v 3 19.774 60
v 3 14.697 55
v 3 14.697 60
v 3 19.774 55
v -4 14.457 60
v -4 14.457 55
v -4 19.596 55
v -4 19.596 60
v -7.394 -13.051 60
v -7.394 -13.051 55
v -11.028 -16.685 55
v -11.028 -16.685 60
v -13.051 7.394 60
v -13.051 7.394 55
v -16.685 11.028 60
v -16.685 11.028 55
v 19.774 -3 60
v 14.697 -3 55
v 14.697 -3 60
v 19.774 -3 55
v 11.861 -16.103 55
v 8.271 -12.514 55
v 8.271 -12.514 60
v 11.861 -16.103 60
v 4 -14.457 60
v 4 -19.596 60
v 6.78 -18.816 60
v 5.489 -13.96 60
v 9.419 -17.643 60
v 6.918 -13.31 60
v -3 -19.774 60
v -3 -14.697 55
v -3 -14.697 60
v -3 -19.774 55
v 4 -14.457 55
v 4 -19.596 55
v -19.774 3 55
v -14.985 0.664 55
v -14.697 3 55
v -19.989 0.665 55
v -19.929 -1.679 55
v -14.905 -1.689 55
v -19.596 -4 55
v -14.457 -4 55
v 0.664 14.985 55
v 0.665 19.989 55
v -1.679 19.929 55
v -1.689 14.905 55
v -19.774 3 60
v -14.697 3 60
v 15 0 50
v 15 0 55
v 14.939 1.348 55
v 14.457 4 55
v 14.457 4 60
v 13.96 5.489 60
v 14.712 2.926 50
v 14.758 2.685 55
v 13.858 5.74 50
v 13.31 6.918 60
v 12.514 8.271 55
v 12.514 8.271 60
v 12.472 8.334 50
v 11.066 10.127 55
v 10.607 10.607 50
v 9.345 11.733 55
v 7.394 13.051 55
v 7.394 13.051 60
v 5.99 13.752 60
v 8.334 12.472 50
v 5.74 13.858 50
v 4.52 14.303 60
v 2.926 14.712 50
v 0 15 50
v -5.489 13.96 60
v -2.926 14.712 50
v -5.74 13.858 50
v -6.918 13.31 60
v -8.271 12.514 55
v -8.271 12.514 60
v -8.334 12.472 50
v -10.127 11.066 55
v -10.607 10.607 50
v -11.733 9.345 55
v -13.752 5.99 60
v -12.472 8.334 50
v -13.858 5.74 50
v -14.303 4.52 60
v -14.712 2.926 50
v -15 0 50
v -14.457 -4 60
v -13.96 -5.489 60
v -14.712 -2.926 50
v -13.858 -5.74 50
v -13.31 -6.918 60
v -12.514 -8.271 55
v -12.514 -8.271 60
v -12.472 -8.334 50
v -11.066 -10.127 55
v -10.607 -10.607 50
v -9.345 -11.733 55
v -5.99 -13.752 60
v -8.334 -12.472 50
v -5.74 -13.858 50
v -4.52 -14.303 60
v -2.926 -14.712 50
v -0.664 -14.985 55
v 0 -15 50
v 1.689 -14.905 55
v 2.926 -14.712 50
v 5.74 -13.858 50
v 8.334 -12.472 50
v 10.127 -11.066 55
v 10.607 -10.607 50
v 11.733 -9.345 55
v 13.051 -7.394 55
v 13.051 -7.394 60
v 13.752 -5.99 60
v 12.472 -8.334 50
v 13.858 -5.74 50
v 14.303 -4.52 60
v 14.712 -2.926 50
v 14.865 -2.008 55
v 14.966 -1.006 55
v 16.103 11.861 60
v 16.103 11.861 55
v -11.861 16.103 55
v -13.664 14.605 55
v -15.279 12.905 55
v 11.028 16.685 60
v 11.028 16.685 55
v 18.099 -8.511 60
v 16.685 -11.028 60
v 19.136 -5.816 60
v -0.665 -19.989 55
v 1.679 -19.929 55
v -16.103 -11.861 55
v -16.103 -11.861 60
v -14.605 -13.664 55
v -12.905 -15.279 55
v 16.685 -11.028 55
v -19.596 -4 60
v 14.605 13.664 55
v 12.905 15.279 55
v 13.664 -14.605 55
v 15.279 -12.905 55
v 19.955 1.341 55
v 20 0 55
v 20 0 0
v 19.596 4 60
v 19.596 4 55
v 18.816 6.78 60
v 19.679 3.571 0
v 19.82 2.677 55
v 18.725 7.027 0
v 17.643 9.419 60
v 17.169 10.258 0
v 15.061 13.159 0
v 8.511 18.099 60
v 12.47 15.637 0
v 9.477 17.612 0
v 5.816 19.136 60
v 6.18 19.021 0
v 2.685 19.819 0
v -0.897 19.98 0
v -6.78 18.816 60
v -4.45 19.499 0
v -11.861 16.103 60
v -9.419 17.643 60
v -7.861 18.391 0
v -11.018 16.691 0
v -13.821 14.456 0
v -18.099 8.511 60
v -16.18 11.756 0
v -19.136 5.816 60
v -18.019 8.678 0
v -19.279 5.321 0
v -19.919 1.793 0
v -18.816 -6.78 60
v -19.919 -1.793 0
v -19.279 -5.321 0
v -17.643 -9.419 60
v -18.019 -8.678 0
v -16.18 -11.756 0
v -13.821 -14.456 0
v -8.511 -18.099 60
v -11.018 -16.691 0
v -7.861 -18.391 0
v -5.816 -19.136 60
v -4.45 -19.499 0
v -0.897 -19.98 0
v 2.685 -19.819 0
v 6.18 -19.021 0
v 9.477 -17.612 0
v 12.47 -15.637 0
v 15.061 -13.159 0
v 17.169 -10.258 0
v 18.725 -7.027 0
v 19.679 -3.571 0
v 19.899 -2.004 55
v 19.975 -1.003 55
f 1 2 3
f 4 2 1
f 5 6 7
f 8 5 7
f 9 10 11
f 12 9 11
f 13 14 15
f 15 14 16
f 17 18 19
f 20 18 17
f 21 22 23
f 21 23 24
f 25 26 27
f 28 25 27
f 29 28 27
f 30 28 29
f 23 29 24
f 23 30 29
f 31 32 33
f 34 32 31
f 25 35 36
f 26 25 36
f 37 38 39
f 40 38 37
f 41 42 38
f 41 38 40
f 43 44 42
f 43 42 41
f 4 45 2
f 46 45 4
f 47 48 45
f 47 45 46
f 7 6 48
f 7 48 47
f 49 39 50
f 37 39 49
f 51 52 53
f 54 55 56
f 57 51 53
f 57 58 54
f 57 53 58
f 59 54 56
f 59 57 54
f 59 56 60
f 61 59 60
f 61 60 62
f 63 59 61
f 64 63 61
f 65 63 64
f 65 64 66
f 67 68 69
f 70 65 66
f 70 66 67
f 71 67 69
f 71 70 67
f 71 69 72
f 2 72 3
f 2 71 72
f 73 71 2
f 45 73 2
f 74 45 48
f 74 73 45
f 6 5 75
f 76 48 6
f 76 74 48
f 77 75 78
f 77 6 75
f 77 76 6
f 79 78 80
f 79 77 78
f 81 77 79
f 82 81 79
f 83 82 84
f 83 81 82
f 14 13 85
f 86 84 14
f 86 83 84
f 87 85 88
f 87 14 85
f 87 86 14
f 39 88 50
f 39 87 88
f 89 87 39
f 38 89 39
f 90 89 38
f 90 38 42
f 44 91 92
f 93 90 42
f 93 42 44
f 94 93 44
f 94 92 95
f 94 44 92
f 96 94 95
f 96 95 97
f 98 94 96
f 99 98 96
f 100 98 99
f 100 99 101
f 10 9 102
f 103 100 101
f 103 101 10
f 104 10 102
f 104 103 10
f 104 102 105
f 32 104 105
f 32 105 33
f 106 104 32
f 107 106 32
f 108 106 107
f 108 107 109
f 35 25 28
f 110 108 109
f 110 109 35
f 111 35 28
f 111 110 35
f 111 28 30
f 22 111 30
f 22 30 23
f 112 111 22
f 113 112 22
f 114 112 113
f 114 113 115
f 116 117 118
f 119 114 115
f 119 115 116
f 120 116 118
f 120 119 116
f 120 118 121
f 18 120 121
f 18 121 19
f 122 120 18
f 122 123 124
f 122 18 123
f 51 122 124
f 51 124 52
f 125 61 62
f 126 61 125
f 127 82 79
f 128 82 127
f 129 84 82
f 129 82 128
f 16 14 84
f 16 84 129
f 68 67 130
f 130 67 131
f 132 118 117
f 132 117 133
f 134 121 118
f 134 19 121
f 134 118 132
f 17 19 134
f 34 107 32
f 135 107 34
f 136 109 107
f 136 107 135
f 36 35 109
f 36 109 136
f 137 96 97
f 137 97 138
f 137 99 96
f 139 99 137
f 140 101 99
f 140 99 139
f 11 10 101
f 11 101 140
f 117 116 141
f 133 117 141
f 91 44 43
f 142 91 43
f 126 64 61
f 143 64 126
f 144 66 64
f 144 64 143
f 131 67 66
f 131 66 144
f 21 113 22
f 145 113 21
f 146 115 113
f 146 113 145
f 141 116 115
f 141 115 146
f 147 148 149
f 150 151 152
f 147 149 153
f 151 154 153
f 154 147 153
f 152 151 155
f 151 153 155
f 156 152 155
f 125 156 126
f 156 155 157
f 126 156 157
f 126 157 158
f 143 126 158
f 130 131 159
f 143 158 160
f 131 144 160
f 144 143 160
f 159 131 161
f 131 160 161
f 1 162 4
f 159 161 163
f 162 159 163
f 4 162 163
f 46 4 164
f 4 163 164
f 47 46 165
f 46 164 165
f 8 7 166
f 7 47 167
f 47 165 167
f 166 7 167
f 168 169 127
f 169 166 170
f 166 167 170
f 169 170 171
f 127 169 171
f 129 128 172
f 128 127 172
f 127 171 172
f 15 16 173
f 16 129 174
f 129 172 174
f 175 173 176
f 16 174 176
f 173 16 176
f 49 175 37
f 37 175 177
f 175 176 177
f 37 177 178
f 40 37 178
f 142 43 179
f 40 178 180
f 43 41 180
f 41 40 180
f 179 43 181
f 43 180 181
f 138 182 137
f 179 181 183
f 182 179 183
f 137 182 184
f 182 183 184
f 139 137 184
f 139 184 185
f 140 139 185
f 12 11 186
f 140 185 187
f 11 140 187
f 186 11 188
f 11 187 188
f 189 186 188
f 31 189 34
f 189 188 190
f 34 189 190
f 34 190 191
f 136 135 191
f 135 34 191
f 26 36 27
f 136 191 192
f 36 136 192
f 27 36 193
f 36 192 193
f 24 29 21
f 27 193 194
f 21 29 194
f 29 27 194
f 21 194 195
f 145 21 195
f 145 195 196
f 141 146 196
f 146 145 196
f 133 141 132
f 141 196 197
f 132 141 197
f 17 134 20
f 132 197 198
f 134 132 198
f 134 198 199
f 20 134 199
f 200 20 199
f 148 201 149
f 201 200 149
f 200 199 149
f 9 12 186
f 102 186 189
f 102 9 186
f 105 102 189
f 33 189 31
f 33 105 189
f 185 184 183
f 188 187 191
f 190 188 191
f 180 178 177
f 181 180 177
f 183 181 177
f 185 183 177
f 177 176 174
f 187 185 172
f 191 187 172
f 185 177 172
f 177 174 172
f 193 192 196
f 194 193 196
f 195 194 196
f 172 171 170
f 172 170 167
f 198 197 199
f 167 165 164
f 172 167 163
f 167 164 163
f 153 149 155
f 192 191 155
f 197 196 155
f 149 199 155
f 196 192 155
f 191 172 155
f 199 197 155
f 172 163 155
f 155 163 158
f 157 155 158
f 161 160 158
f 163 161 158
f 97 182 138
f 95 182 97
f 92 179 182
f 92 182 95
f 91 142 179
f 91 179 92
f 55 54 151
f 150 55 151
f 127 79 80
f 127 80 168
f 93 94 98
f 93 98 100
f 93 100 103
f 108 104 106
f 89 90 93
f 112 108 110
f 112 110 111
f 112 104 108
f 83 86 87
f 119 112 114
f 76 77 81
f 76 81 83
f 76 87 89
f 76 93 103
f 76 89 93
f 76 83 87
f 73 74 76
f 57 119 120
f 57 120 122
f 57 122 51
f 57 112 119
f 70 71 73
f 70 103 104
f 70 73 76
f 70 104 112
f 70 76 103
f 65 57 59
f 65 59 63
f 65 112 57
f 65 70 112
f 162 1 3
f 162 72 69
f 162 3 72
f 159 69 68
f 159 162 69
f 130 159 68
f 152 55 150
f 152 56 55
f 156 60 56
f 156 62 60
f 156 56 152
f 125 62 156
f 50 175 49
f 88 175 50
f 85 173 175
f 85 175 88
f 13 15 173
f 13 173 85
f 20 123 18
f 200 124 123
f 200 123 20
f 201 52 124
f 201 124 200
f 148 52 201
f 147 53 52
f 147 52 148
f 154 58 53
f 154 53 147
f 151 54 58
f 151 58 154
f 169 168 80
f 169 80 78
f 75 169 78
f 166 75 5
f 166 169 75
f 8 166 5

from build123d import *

# Parameters (mm, degrees)
BOX_W             = 7
BOX_H             = 7
BOX_DEPTH         = 7
ARRAY_COUNT       = 8
CYLINDER002_R     = 15
CYLINDER002_DEPTH = 10
CYLINDER001_R     = 20
CYLINDER001_DEPTH = 20
CYLINDER_R        = 20
CYLINDER_DEPTH    = 50


with BuildPart() as array:
    # Box → Box (new body)
    with BuildSketch(Plane(origin=(14, -3, 57), x_dir=(1, 0, 0), z_dir=(0, 0, 1))):
        with Locations((3.5, 3.5)):
            Rectangle(BOX_W, BOX_H)
    extrude(amount=BOX_DEPTH)

    # Array: Array ×8 about axis
    array_axis = Axis((0, 0, 0), (0, 0, 1))


with BuildPart() as array_1:
    add(array.part)
    for i in range(1, ARRAY_COUNT):
        add(array.part.rotate(array_axis, i * 360 / ARRAY_COUNT))


with BuildPart() as array_2:
    # Array placement: moved
    add(array_1.part.moved(Location((0, 0, -2))))


with BuildPart() as cilindre002:
    # Cylinder002 → Cylinder002 (new body)
    with BuildSketch(Plane.XY.offset(50)):
        Circle(CYLINDER002_R)
    extrude(amount=CYLINDER002_DEPTH)


with BuildPart() as cut:
    # Cylinder001 → Cylinder001 (new body)
    with BuildSketch(Plane.XY.offset(40)):
        Circle(CYLINDER001_R)
    extrude(amount=CYLINDER001_DEPTH)

    # Cut: cut Cilindre002
    add(cilindre002.part, mode=Mode.SUBTRACT)


with BuildPart() as cut001:
    # Cylinder → Cylinder (new body)
    with BuildSketch(Plane.XY):
        Circle(CYLINDER_R)
    extrude(amount=CYLINDER_DEPTH)

    # Fusion: union Cut
    add(cut.part)

    # Cut001: cut Array
    add(array_2.part, mode=Mode.SUBTRACT)


solid = cut001.part
